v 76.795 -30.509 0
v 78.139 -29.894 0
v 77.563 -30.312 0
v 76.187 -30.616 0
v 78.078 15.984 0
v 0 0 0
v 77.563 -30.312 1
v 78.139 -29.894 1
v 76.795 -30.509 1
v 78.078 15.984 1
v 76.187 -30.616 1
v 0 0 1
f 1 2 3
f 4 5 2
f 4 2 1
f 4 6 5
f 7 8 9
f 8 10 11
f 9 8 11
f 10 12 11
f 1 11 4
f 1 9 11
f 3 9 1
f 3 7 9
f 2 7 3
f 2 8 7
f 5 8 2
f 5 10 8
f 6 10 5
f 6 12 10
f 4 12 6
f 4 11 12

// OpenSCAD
// Generated by SolidPython 1.1.3 on 2024-05-19 23:35:49


linear_extrude(height = 1) {
	polygon(points = [[0, 0], [76.1867937500, -30.6162875000], [76.2421125000, -30.6065250000], [76.2974312500, -30.5967625000], [76.3527500000, -30.5870000000], [76.4080687500, -30.5772375000], [76.4633875000, -30.5674750000], [76.5187062500, -30.5577125000], [76.5740250000, -30.5479500000], [76.6293437500, -30.5381875000], [76.6846625000, -30.5284250000], [76.7399812500, -30.5186625000], [76.7953000000, -30.5089000000], [76.8603250000, -30.4922750000], [76.9253500000, -30.4756500000], [76.9903750000, -30.4590250000], [77.0554000000, -30.4424000000], [77.1204250000, -30.4257750000], [77.1854500000, -30.4091500000], [77.2504750000, -30.3925250000], [77.3155000000, -30.3759000000], [77.3774500000, -30.3600500000], [77.4394000000, -30.3442000000], [77.5013500000, -30.3283500000], [77.5633000000, -30.3125000000], [77.6128375000, -30.2765625000], [77.6623750000, -30.2406250000], [77.7119125000, -30.2046875000], [77.7614500000, -30.1687500000], [77.8109875000, -30.1328125000], [77.8605250000, -30.0968750000], [77.9100625000, -30.0609375000], [77.9596000000, -30.0250000000], [78.0045750000, -29.9923750000], [78.0495500000, -29.9597500000], [78.0945250000, -29.9271250000], [78.1395000000, -29.8945000000], [78.1394209961, -29.8359062500], [78.1393419922, -29.7773125000], [78.1392629883, -29.7187187500], [78.1391839844, -29.6601250000], [78.1391049805, -29.6015312500], [78.1390259766, -29.5429375000], [78.1389469727, -29.4843437500], [78.1388679687, -29.4257500000], [78.1387889648, -29.3671562500], [78.1387099609, -29.3085625000], [78.1386309570, -29.2499687500], [78.1385519531, -29.1913750000], [78.1384729492, -29.1327812500], [78.1383939453, -29.0741875000], [78.1383149414, -29.0155937500], [78.1382359375, -28.9570000000], [78.1381569336, -28.8984062500], [78.1380779297, -28.8398125000], [78.1379989258, -28.7812187500], [78.1379199219, -28.7226250000], [78.1378409180, -28.6640312500], [78.1377619141, -28.6054375000], [78.1376829102, -28.5468437500], [78.1376039063, -28.4882500000], [78.1375249023, -28.4296562500], [78.1374458984, -28.3710625000], [78.1373668945, -28.3124687500], [78.1372878906, -28.2538750000], [78.1372088867, -28.1952812500], [78.1371298828, -28.1366875000], [78.1370508789, -28.0780937500], [78.1369718750, -28.0195000000], [78.1368928711, -27.9609062500], [78.1368138672, -27.9023125000], [78.1367348633, -27.8437187500], [78.1366558594, -27.7851250000], [78.1365768555, -27.7265312500], [78.1364978516, -27.6679375000], [78.1364188477, -27.6093437500], [78.1363398437, -27.5507500000], [78.1362608398, -27.4921562500], [78.1361818359, -27.4335625000], [78.1361028320, -27.3749687500], [78.1360238281, -27.3163750000], [78.1359448242, -27.2577812500], [78.1358658203, -27.1991875000], [78.1357868164, -27.1405937500], [78.1357078125, -27.0820000000], [78.1356288086, -27.0234062500], [78.1355498047, -26.9648125000], [78.1354708008, -26.9062187500], [78.1353917969, -26.8476250000], [78.1353127930, -26.7890312500], [78.1352337891, -26.7304375000], [78.1351547852, -26.6718437500], [78.1350757813, -26.6132500000], [78.1349967773, -26.5546562500], [78.1349177734, -26.4960625000], [78.1348387695, -26.4374687500], [78.1347597656, -26.3788750000], [78.1346807617, -26.3202812500], [78.1346017578, -26.2616875000], [78.1345227539, -26.2030937500], [78.1344437500, -26.1445000000], [78.1343647461, -26.0859062500], [78.1342857422, -26.0273125000], [78.1342067383, -25.9687187500], [78.1341277344, -25.9101250000], [78.1340487305, -25.8515312500], [78.1339697266, -25.7929375000], [78.1338907227, -25.7343437500], [78.1338117187, -25.6757500000], [78.1337327148, -25.6171562500], [78.1336537109, -25.5585625000], [78.1335747070, -25.4999687500], [78.1334957031, -25.4413750000], [78.1334166992, -25.3827812500], [78.1333376953, -25.3241875000], [78.1332586914, -25.2655937500], [78.1331796875, -25.2070000000], [78.1331006836, -25.1484062500], [78.1330216797, -25.0898125000], [78.1329426758, -25.0312187500], [78.1328636719, -24.9726250000], [78.1327846680, -24.9140312500], [78.1327056641, -24.8554375000], [78.1326266602, -24.7968437500], [78.1325476563, -24.7382500000], [78.1324686523, -24.6796562500], [78.1323896484, -24.6210625000], [78.1323106445, -24.5624687500], [78.1322316406, -24.5038750000], [78.1321526367, -24.4452812500], [78.1320736328, -24.3866875000], [78.1319946289, -24.3280937500], [78.1319156250, -24.2695000000], [78.1318366211, -24.2109062500], [78.1317576172, -24.1523125000], [78.1316786133, -24.0937187500], [78.1315996094, -24.0351250000], [78.1315206055, -23.9765312500], [78.1314416016, -23.9179375000], [78.1313625977, -23.8593437500], [78.1312835937, -23.8007500000], [78.1312045898, -23.7421562500], [78.1311255859, -23.6835625000], [78.1310465820, -23.6249687500], [78.1309675781, -23.5663750000], [78.1308885742, -23.5077812500], [78.1308095703, -23.4491875000], [78.1307305664, -23.3905937500], [78.1306515625, -23.3320000000], [78.1305725586, -23.2734062500], [78.1304935547, -23.2148125000], [78.1304145508, -23.1562187500], [78.1303355469, -23.0976250000], [78.1302565430, -23.0390312500], [78.1301775391, -22.9804375000], [78.1300985352, -22.9218437500], [78.1300195313, -22.8632500000], [78.1299405273, -22.8046562500], [78.1298615234, -22.7460625000], [78.1297825195, -22.6874687500], [78.1297035156, -22.6288750000], [78.1296245117, -22.5702812500], [78.1295455078, -22.5116875000], [78.1294665039, -22.4530937500], [78.1293875000, -22.3945000000], [78.1293084961, -22.3359062500], [78.1292294922, -22.2773125000], [78.1291504883, -22.2187187500], [78.1290714844, -22.1601250000], [78.1289924805, -22.1015312500], [78.1289134766, -22.0429375000], [78.1288344727, -21.9843437500], [78.1287554688, -21.9257500000], [78.1286764648, -21.8671562500], [78.1285974609, -21.8085625000], [78.1285184570, -21.7499687500], [78.1284394531, -21.6913750000], [78.1283604492, -21.6327812500], [78.1282814453, -21.5741875000], [78.1282024414, -21.5155937500], [78.1281234375, -21.4570000000], [78.1280444336, -21.3984062500], [78.1279654297, -21.3398125000], [78.1278864258, -21.2812187500], [78.1278074219, -21.2226250000], [78.1277284180, -21.1640312500], [78.1276494141, -21.1054375000], [78.1275704102, -21.0468437500], [78.1274914063, -20.9882500000], [78.1274124023, -20.9296562500], [78.1273333984, -20.8710625000], [78.1272543945, -20.8124687500], [78.1271753906, -20.7538750000], [78.1270963867, -20.6952812500], [78.1270173828, -20.6366875000], [78.1269383789, -20.5780937500], [78.1268593750, -20.5195000000], [78.1267803711, -20.4609062500], [78.1267013672, -20.4023125000], [78.1266223633, -20.3437187500], [78.1265433594, -20.2851250000], [78.1264643555, -20.2265312500], [78.1263853516, -20.1679375000], [78.1263063477, -20.1093437500], [78.1262273438, -20.0507500000], [78.1261483398, -19.9921562500], [78.1260693359, -19.9335625000], [78.1259903320, -19.8749687500], [78.1259113281, -19.8163750000], [78.1258323242, -19.7577812500], [78.1257533203, -19.6991875000], [78.1256743164, -19.6405937500], [78.1255953125, -19.5820000000], [78.1255163086, -19.5234062500], [78.1254373047, -19.4648125000], [78.1253583008, -19.4062187500], [78.1252792969, -19.3476250000], [78.1252002930, -19.2890312500], [78.1251212891, -19.2304375000], [78.1250422852, -19.1718437500], [78.1249632813, -19.1132500000], [78.1248842773, -19.0546562500], [78.1248052734, -18.9960625000], [78.1247262695, -18.9374687500], [78.1246472656, -18.8788750000], [78.1245682617, -18.8202812500], [78.1244892578, -18.7616875000], [78.1244102539, -18.7030937500], [78.1243312500, -18.6445000000], [78.1242522461, -18.5859062500], [78.1241732422, -18.5273125000], [78.1240942383, -18.4687187500], [78.1240152344, -18.4101250000], [78.1239362305, -18.3515312500], [78.1238572266, -18.2929375000], [78.1237782227, -18.2343437500], [78.1236992188, -18.1757500000], [78.1236202148, -18.1171562500], [78.1235412109, -18.0585625000], [78.1234622070, -17.9999687500], [78.1233832031, -17.9413750000], [78.1233041992, -17.8827812500], [78.1232251953, -17.8241875000], [78.1231461914, -17.7655937500], [78.1230671875, -17.7070000000], [78.1229881836, -17.6484062500], [78.1229091797, -17.5898125000], [78.1228301758, -17.5312187500], [78.1227511719, -17.4726250000], [78.1226721680, -17.4140312500], [78.1225931641, -17.3554375000], [78.1225141602, -17.2968437500], [78.1224351563, -17.2382500000], [78.1223561523, -17.1796562500], [78.1222771484, -17.1210625000], [78.1221981445, -17.0624687500], [78.1221191406, -17.0038750000], [78.1220401367, -16.9452812500], [78.1219611328, -16.8866875000], [78.1218821289, -16.8280937500], [78.1218031250, -16.7695000000], [78.1217241211, -16.7109062500], [78.1216451172, -16.6523125000], [78.1215661133, -16.5937187500], [78.1214871094, -16.5351250000], [78.1214081055, -16.4765312500], [78.1213291016, -16.4179375000], [78.1212500977, -16.3593437500], [78.1211710938, -16.3007500000], [78.1210920898, -16.2421562500], [78.1210130859, -16.1835625000], [78.1209340820, -16.1249687500], [78.1208550781, -16.0663750000], [78.1207760742, -16.0077812500], [78.1206970703, -15.9491875000], [78.1206180664, -15.8905937500], [78.1205390625, -15.8320000000], [78.1204600586, -15.7734062500], [78.1203810547, -15.7148125000], [78.1203020508, -15.6562187500], [78.1202230469, -15.5976250000], [78.1201440430, -15.5390312500], [78.1200650391, -15.4804375000], [78.1199860352, -15.4218437500], [78.1199070312, -15.3632500000], [78.1198280273, -15.3046562500], [78.1197490234, -15.2460625000], [78.1196700195, -15.1874687500], [78.1195910156, -15.1288750000], [78.1195120117, -15.0702812500], [78.1194330078, -15.0116875000], [78.1193540039, -14.9530937500], [78.1192750000, -14.8945000000], [78.1191959961, -14.8359062500], [78.1191169922, -14.7773125000], [78.1190379883, -14.7187187500], [78.1189589844, -14.6601250000], [78.1188799805, -14.6015312500], [78.1188009766, -14.5429375000], [78.1187219727, -14.4843437500], [78.1186429688, -14.4257500000], [78.1185639648, -14.3671562500], [78.1184849609, -14.3085625000], [78.1184059570, -14.2499687500], [78.1183269531, -14.1913750000], [78.1182479492, -14.1327812500], [78.1181689453, -14.0741875000], [78.1180899414, -14.0155937500], [78.1180109375, -13.9570000000], [78.1179319336, -13.8984062500], [78.1178529297, -13.8398125000], [78.1177739258, -13.7812187500], [78.1176949219, -13.7226250000], [78.1176159180, -13.6640312500], [78.1175369141, -13.6054375000], [78.1174579102, -13.5468437500], [78.1173789062, -13.4882500000], [78.1172999023, -13.4296562500], [78.1172208984, -13.3710625000], [78.1171418945, -13.3124687500], [78.1170628906, -13.2538750000], [78.1169838867, -13.1952812500], [78.1169048828, -13.1366875000], [78.1168258789, -13.0780937500], [78.1167468750, -13.0195000000], [78.1166678711, -12.9609062500], [78.1165888672, -12.9023125000], [78.1165098633, -12.8437187500], [78.1164308594, -12.7851250000], [78.1163518555, -12.7265312500], [78.1162728516, -12.6679375000], [78.1161938477, -12.6093437500], [78.1161148437, -12.5507500000], [78.1160358398, -12.4921562500], [78.1159568359, -12.4335625000], [78.1158778320, -12.3749687500], [78.1157988281, -12.3163750000], [78.1157198242, -12.2577812500], [78.1156408203, -12.1991875000], [78.1155618164, -12.1405937500], [78.1154828125, -12.0820000000], [78.1154038086, -12.0234062500], [78.1153248047, -11.9648125000], [78.1152458008, -11.9062187500], [78.1151667969, -11.8476250000], [78.1150877930, -11.7890312500], [78.1150087891, -11.7304375000], [78.1149297852, -11.6718437500], [78.1148507812, -11.6132500000], [78.1147717773, -11.5546562500], [78.1146927734, -11.4960625000], [78.1146137695, -11.4374687500], [78.1145347656, -11.3788750000], [78.1144557617, -11.3202812500], [78.1143767578, -11.2616875000], [78.1142977539, -11.2030937500], [78.1142187500, -11.1445000000], [78.1141397461, -11.0859062500], [78.1140607422, -11.0273125000], [78.1139817383, -10.9687187500], [78.1139027344, -10.9101250000], [78.1138237305, -10.8515312500], [78.1137447266, -10.7929375000], [78.1136657227, -10.7343437500], [78.1135867187, -10.6757500000], [78.1135077148, -10.6171562500], [78.1134287109, -10.5585625000], [78.1133497070, -10.4999687500], [78.1132707031, -10.4413750000], [78.1131916992, -10.3827812500], [78.1131126953, -10.3241875000], [78.1130336914, -10.2655937500], [78.1129546875, -10.2070000000], [78.1128756836, -10.1484062500], [78.1127966797, -10.0898125000], [78.1127176758, -10.0312187500], [78.1126386719, -9.9726250000], [78.1125596680, -9.9140312500], [78.1124806641, -9.8554375000], [78.1124016602, -9.7968437500], [78.1123226563, -9.7382500000], [78.1122436523, -9.6796562500], [78.1121646484, -9.6210625000], [78.1120856445, -9.5624687500], [78.1120066406, -9.5038750000], [78.1119276367, -9.4452812500], [78.1118486328, -9.3866875000], [78.1117696289, -9.3280937500], [78.1116906250, -9.2695000000], [78.1116116211, -9.2109062500], [78.1115326172, -9.1523125000], [78.1114536133, -9.0937187500], [78.1113746094, -9.0351250000], [78.1112956055, -8.9765312500], [78.1112166016, -8.9179375000], [78.1111375977, -8.8593437500], [78.1110585937, -8.8007500000], [78.1109795898, -8.7421562500], [78.1109005859, -8.6835625000], [78.1108215820, -8.6249687500], [78.1107425781, -8.5663750000], [78.1106635742, -8.5077812500], [78.1105845703, -8.4491875000], [78.1105055664, -8.3905937500], [78.1104265625, -8.3320000000], [78.1103475586, -8.2734062500], [78.1102685547, -8.2148125000], [78.1101895508, -8.1562187500], [78.1101105469, -8.0976250000], [78.1100315430, -8.0390312500], [78.1099525391, -7.9804375000], [78.1098735352, -7.9218437500], [78.1097945313, -7.8632500000], [78.1097155273, -7.8046562500], [78.1096365234, -7.7460625000], [78.1095575195, -7.6874687500], [78.1094785156, -7.6288750000], [78.1093995117, -7.5702812500], [78.1093205078, -7.5116875000], [78.1092415039, -7.4530937500], [78.1091625000, -7.3945000000], [78.1090834961, -7.3359062500], [78.1090044922, -7.2773125000], [78.1089254883, -7.2187187500], [78.1088464844, -7.1601250000], [78.1087674805, -7.1015312500], [78.1086884766, -7.0429375000], [78.1086094727, -6.9843437500], [78.1085304687, -6.9257500000], [78.1084514648, -6.8671562500], [78.1083724609, -6.8085625000], [78.1082934570, -6.7499687500], [78.1082144531, -6.6913750000], [78.1081354492, -6.6327812500], [78.1080564453, -6.5741875000], [78.1079774414, -6.5155937500], [78.1078984375, -6.4570000000], [78.1078194336, -6.3984062500], [78.1077404297, -6.3398125000], [78.1076614258, -6.2812187500], [78.1075824219, -6.2226250000], [78.1075034180, -6.1640312500], [78.1074244141, -6.1054375000], [78.1073454102, -6.0468437500], [78.1072664063, -5.9882500000], [78.1071874023, -5.9296562500], [78.1071083984, -5.8710625000], [78.1070293945, -5.8124687500], [78.1069503906, -5.7538750000], [78.1068713867, -5.6952812500], [78.1067923828, -5.6366875000], [78.1067133789, -5.5780937500], [78.1066343750, -5.5195000000], [78.1065553711, -5.4609062500], [78.1064763672, -5.4023125000], [78.1063973633, -5.3437187500], [78.1063183594, -5.2851250000], [78.1062393555, -5.2265312500], [78.1061603516, -5.1679375000], [78.1060813477, -5.1093437500], [78.1060023437, -5.0507500000], [78.1059233398, -4.9921562500], [78.1058443359, -4.9335625000], [78.1057653320, -4.8749687500], [78.1056863281, -4.8163750000], [78.1056073242, -4.7577812500], [78.1055283203, -4.6991875000], [78.1054493164, -4.6405937500], [78.1053703125, -4.5820000000], [78.1052913086, -4.5234062500], [78.1052123047, -4.4648125000], [78.1051333008, -4.4062187500], [78.1050542969, -4.3476250000], [78.1049752930, -4.2890312500], [78.1048962891, -4.2304375000], [78.1048172852, -4.1718437500], [78.1047382813, -4.1132500000], [78.1046592773, -4.0546562500], [78.1045802734, -3.9960625000], [78.1045012695, -3.9374687500], [78.1044222656, -3.8788750000], [78.1043432617, -3.8202812500], [78.1042642578, -3.7616875000], [78.1041852539, -3.7030937500], [78.1041062500, -3.6445000000], [78.1040272461, -3.5859062500], [78.1039482422, -3.5273125000], [78.1038692383, -3.4687187500], [78.1037902344, -3.4101250000], [78.1037112305, -3.3515312500], [78.1036322266, -3.2929375000], [78.1035532227, -3.2343437500], [78.1034742187, -3.1757500000], [78.1033952148, -3.1171562500], [78.1033162109, -3.0585625000], [78.1032372070, -2.9999687500], [78.1031582031, -2.9413750000], [78.1030791992, -2.8827812500], [78.1030001953, -2.8241875000], [78.1029211914, -2.7655937500], [78.1028421875, -2.7070000000], [78.1027631836, -2.6484062500], [78.1026841797, -2.5898125000], [78.1026051758, -2.5312187500], [78.1025261719, -2.4726250000], [78.1024471680, -2.4140312500], [78.1023681641, -2.3554375000], [78.1022891602, -2.2968437500], [78.1022101563, -2.2382500000], [78.1021311523, -2.1796562500], [78.1020521484, -2.1210625000], [78.1019731445, -2.0624687500], [78.1018941406, -2.0038750000], [78.1018151367, -1.9452812500], [78.1017361328, -1.8866875000], [78.1016571289, -1.8280937500], [78.1015781250, -1.7695000000], [78.1014991211, -1.7109062500], [78.1014201172, -1.6523125000], [78.1013411133, -1.5937187500], [78.1012621094, -1.5351250000], [78.1011831055, -1.4765312500], [78.1011041016, -1.4179375000], [78.1010250977, -1.3593437500], [78.1009460937, -1.3007500000], [78.1008670898, -1.2421562500], [78.1007880859, -1.1835625000], [78.1007090820, -1.1249687500], [78.1006300781, -1.0663750000], [78.1005510742, -1.0077812500], [78.1004720703, -0.9491875000], [78.1003930664, -0.8905937500], [78.1003140625, -0.8320000000], [78.1002350586, -0.7734062500], [78.1001560547, -0.7148125000], [78.1000770508, -0.6562187500], [78.0999980469, -0.5976250000], [78.0999190430, -0.5390312500], [78.0998400391, -0.4804375000], [78.0997610352, -0.4218437500], [78.0996820313, -0.3632500000], [78.0996030273, -0.3046562500], [78.0995240234, -0.2460625000], [78.0994450195, -0.1874687500], [78.0993660156, -0.1288750000], [78.0992870117, -0.0702812500], [78.0992080078, -0.0116875000], [78.0991290039, 0.0469062500], [78.0990500000, 0.1055000000], [78.0989709961, 0.1640937500], [78.0988919922, 0.2226875000], [78.0988129883, 0.2812812500], [78.0987339844, 0.3398750000], [78.0986549805, 0.3984687500], [78.0985759766, 0.4570625000], [78.0984969727, 0.5156562500], [78.0984179687, 0.5742500000], [78.0983389648, 0.6328437500], [78.0982599609, 0.6914375000], [78.0981809570, 0.7500312500], [78.0981019531, 0.8086250000], [78.0980229492, 0.8672187500], [78.0979439453, 0.9258125000], [78.0978649414, 0.9844062500], [78.0977859375, 1.0430000000], [78.0977069336, 1.1015937500], [78.0976279297, 1.1601875000], [78.0975489258, 1.2187812500], [78.0974699219, 1.2773750000], [78.0973909180, 1.3359687500], [78.0973119141, 1.3945625000], [78.0972329102, 1.4531562500], [78.0971539063, 1.5117500000], [78.0970749023, 1.5703437500], [78.0969958984, 1.6289375000], [78.0969168945, 1.6875312500], [78.0968378906, 1.7461250000], [78.0967588867, 1.8047187500], [78.0966798828, 1.8633125000], [78.0966008789, 1.9219062500], [78.0965218750, 1.9805000000], [78.0964428711, 2.0390937500], [78.0963638672, 2.0976875000], [78.0962848633, 2.1562812500], [78.0962058594, 2.2148750000], [78.0961268555, 2.2734687500], [78.0960478516, 2.3320625000], [78.0959688477, 2.3906562500], [78.0958898438, 2.4492500000], [78.0958108398, 2.5078437500], [78.0957318359, 2.5664375000], [78.0956528320, 2.6250312500], [78.0955738281, 2.6836250000], [78.0954948242, 2.7422187500], [78.0954158203, 2.8008125000], [78.0953368164, 2.8594062500], [78.0952578125, 2.9180000000], [78.0951788086, 2.9765937500], [78.0950998047, 3.0351875000], [78.0950208008, 3.0937812500], [78.0949417969, 3.1523750000], [78.0948627930, 3.2109687500], [78.0947837891, 3.2695625000], [78.0947047852, 3.3281562500], [78.0946257813, 3.3867500000], [78.0945467773, 3.4453437500], [78.0944677734, 3.5039375000], [78.0943887695, 3.5625312500], [78.0943097656, 3.6211250000], [78.0942307617, 3.6797187500], [78.0941517578, 3.7383125000], [78.0940727539, 3.7969062500], [78.0939937500, 3.8555000000], [78.0939147461, 3.9140937500], [78.0938357422, 3.9726875000], [78.0937567383, 4.0312812500], [78.0936777344, 4.0898750000], [78.0935987305, 4.1484687500], [78.0935197266, 4.2070625000], [78.0934407227, 4.2656562500], [78.0933617188, 4.3242500000], [78.0932827148, 4.3828437500], [78.0932037109, 4.4414375000], [78.0931247070, 4.5000312500], [78.0930457031, 4.5586250000], [78.0929666992, 4.6172187500], [78.0928876953, 4.6758125000], [78.0928086914, 4.7344062500], [78.0927296875, 4.7930000000], [78.0926506836, 4.8515937500], [78.0925716797, 4.9101875000], [78.0924926758, 4.9687812500], [78.0924136719, 5.0273750000], [78.0923346680, 5.0859687500], [78.0922556641, 5.1445625000], [78.0921766602, 5.2031562500], [78.0920976563, 5.2617500000], [78.0920186523, 5.3203437500], [78.0919396484, 5.3789375000], [78.0918606445, 5.4375312500], [78.0917816406, 5.4961250000], [78.0917026367, 5.5547187500], [78.0916236328, 5.6133125000], [78.0915446289, 5.6719062500], [78.0914656250, 5.7305000000], [78.0913866211, 5.7890937500], [78.0913076172, 5.8476875000], [78.0912286133, 5.9062812500], [78.0911496094, 5.9648750000], [78.0910706055, 6.0234687500], [78.0909916016, 6.0820625000], [78.0909125977, 6.1406562500], [78.0908335938, 6.1992500000], [78.0907545898, 6.2578437500], [78.0906755859, 6.3164375000], [78.0905965820, 6.3750312500], [78.0905175781, 6.4336250000], [78.0904385742, 6.4922187500], [78.0903595703, 6.5508125000], [78.0902805664, 6.6094062500], [78.0902015625, 6.6680000000], [78.0901225586, 6.7265937500], [78.0900435547, 6.7851875000], [78.0899645508, 6.8437812500], [78.0898855469, 6.9023750000], [78.0898065430, 6.9609687500], [78.0897275391, 7.0195625000], [78.0896485352, 7.0781562500], [78.0895695312, 7.1367500000], [78.0894905273, 7.1953437500], [78.0894115234, 7.2539375000], [78.0893325195, 7.3125312500], [78.0892535156, 7.3711250000], [78.0891745117, 7.4297187500], [78.0890955078, 7.4883125000], [78.0890165039, 7.5469062500], [78.0889375000, 7.6055000000], [78.0888584961, 7.6640937500], [78.0887794922, 7.7226875000], [78.0887004883, 7.7812812500], [78.0886214844, 7.8398750000], [78.0885424805, 7.8984687500], [78.0884634766, 7.9570625000], [78.0883844727, 8.0156562500], [78.0883054688, 8.0742500000], [78.0882264648, 8.1328437500], [78.0881474609, 8.1914375000], [78.0880684570, 8.2500312500], [78.0879894531, 8.3086250000], [78.0879104492, 8.3672187500], [78.0878314453, 8.4258125000], [78.0877524414, 8.4844062500], [78.0876734375, 8.5430000000], [78.0875944336, 8.6015937500], [78.0875154297, 8.6601875000], [78.0874364258, 8.7187812500], [78.0873574219, 8.7773750000], [78.0872784180, 8.8359687500], [78.0871994141, 8.8945625000], [78.0871204102, 8.9531562500], [78.0870414062, 9.0117500000], [78.0869624023, 9.0703437500], [78.0868833984, 9.1289375000], [78.0868043945, 9.1875312500], [78.0867253906, 9.2461250000], [78.0866463867, 9.3047187500], [78.0865673828, 9.3633125000], [78.0864883789, 9.4219062500], [78.0864093750, 9.4805000000], [78.0863303711, 9.5390937500], [78.0862513672, 9.5976875000], [78.0861723633, 9.6562812500], [78.0860933594, 9.7148750000], [78.0860143555, 9.7734687500], [78.0859353516, 9.8320625000], [78.0858563477, 9.8906562500], [78.0857773437, 9.9492500000], [78.0856983398, 10.0078437500], [78.0856193359, 10.0664375000], [78.0855403320, 10.1250312500], [78.0854613281, 10.1836250000], [78.0853823242, 10.2422187500], [78.0853033203, 10.3008125000], [78.0852243164, 10.3594062500], [78.0851453125, 10.4180000000], [78.0850663086, 10.4765937500], [78.0849873047, 10.5351875000], [78.0849083008, 10.5937812500], [78.0848292969, 10.6523750000], [78.0847502930, 10.7109687500], [78.0846712891, 10.7695625000], [78.0845922852, 10.8281562500], [78.0845132812, 10.8867500000], [78.0844342773, 10.9453437500], [78.0843552734, 11.0039375000], [78.0842762695, 11.0625312500], [78.0841972656, 11.1211250000], [78.0841182617, 11.1797187500], [78.0840392578, 11.2383125000], [78.0839602539, 11.2969062500], [78.0838812500, 11.3555000000], [78.0838022461, 11.4140937500], [78.0837232422, 11.4726875000], [78.0836442383, 11.5312812500], [78.0835652344, 11.5898750000], [78.0834862305, 11.6484687500], [78.0834072266, 11.7070625000], [78.0833282227, 11.7656562500], [78.0832492187, 11.8242500000], [78.0831702148, 11.8828437500], [78.0830912109, 11.9414375000], [78.0830122070, 12.0000312500], [78.0829332031, 12.0586250000], [78.0828541992, 12.1172187500], [78.0827751953, 12.1758125000], [78.0826961914, 12.2344062500], [78.0826171875, 12.2930000000], [78.0825381836, 12.3515937500], [78.0824591797, 12.4101875000], [78.0823801758, 12.4687812500], [78.0823011719, 12.5273750000], [78.0822221680, 12.5859687500], [78.0821431641, 12.6445625000], [78.0820641602, 12.7031562500], [78.0819851562, 12.7617500000], [78.0819061523, 12.8203437500], [78.0818271484, 12.8789375000], [78.0817481445, 12.9375312500], [78.0816691406, 12.9961250000], [78.0815901367, 13.0547187500], [78.0815111328, 13.1133125000], [78.0814321289, 13.1719062500], [78.0813531250, 13.2305000000], [78.0812741211, 13.2890937500], [78.0811951172, 13.3476875000], [78.0811161133, 13.4062812500], [78.0810371094, 13.4648750000], [78.0809581055, 13.5234687500], [78.0808791016, 13.5820625000], [78.0808000977, 13.6406562500], [78.0807210937, 13.6992500000], [78.0806420898, 13.7578437500], [78.0805630859, 13.8164375000], [78.0804840820, 13.8750312500], [78.0804050781, 13.9336250000], [78.0803260742, 13.9922187500], [78.0802470703, 14.0508125000], [78.0801680664, 14.1094062500], [78.0800890625, 14.1680000000], [78.0800100586, 14.2265937500], [78.0799310547, 14.2851875000], [78.0798520508, 14.3437812500], [78.0797730469, 14.4023750000], [78.0796940430, 14.4609687500], [78.0796150391, 14.5195625000], [78.0795360352, 14.5781562500], [78.0794570313, 14.6367500000], [78.0793780273, 14.6953437500], [78.0792990234, 14.7539375000], [78.0792200195, 14.8125312500], [78.0791410156, 14.8711250000], [78.0790620117, 14.9297187500], [78.0789830078, 14.9883125000], [78.0789040039, 15.0469062500], [78.0788250000, 15.1055000000], [78.0787459961, 15.1640937500], [78.0786669922, 15.2226875000], [78.0785879883, 15.2812812500], [78.0785089844, 15.3398750000], [78.0784299805, 15.3984687500], [78.0783509766, 15.4570625000], [78.0782719727, 15.5156562500], [78.0781929687, 15.5742500000], [78.0781139648, 15.6328437500], [78.0780349609, 15.6914375000], [78.0779559570, 15.7500312500], [78.0778769531, 15.8086250000], [78.0777979492, 15.8672187500], [78.0777189453, 15.9258125000], [78.0776399414, 15.9844062500]]);
}
/***********************************************
*********      SolidPython code:      **********
************************************************
 
import math
import time

from stl import mesh, Dimension

from tkinter import Tk     # from tkinter import Tk for Python 3.x
from tkinter.filedialog import askopenfilename
from mpl_toolkits.mplot3d import art3d
from matplotlib import pyplot as plt
import solid
import os
import ezdxf
import shapely.geometry as sg
import subprocess
from GUI import getSCADPath



def outputSTL(From, To, PATH=getSCADPath()):
    subprocess.Popen(PATH + " -o " + To + " " + From)
    while not os.path.exists(To):
        time.sleep(1)


def get_size(i):
    x_list = [int(a) for a in str(i)]
    return len(x_list)



class Model:
    def __init__(self, model, fileName, location, layer, thickness):
        self.location = location
        self.code = None
        self.fileName = fileName
        self.stl = fileName + ".stl"
        self.layer = layer
        self.thickness = thickness
        self.maxz = (layer+1)*thickness
        self.dxf = fileName + ".dxf"
        self.scad = fileName + ".scad"
        self.model = model
        self.center = None
        self.width = 10
        self.mesh = None
        self.useable_area = None


    def get_code(self):
        max_dim = 0.05
        max_array = 6

        num = int(self.fileName)
        nums = [int(a) for a in str(num)]
        nums.reverse()
        indices = nums
        length = len(nums)

        print(indices)
        t = 0
        i = 0
        cubes = []
        x = 0
        y = 0
        width = 0.01
        while x <= max_dim:
            while y <= max_dim:
                print(indices)
                if nums == []:
                    break
                if indices[0] != 0:
                    cubes.append(solid.translate([x, y, 0])(solid.cube(size=t / 1000 + 0.001)))
                    y += max_dim / (max_array - 1)
                    nums[0] = nums[0] - 1
                else:
                    indices.pop(0)
                    t += 1
                i += 1
            x += max_dim / (max_array - 1)
            y = 0

        outside = solid.translate([-width / 2, -width / 2])(solid.cube(max_dim + (length - 1) / 1000 + 0.001 + width))
        self.code = solid.difference()(outside, cubes)
        self.code = solid.projection(cut=True)(self.code)
        solid.scad_render_to_file(self.code, self.location + "/code.scad")
        outputSTL(From=self.location+"/code.scad", To=self.location+"code.dxf", PATH=getSCADPath())
        # os.system("toSTL.sh renders/code.scad renders/code.dxf")
        return self.location+"/code.dxf"

    def download(self, type):
        if type =="stl":
            print("generating:" + self.location+"/"+ self.fileName+".stl")
            outputSTL(From=self.location+"/"+self.fileName+".scad", To=self.location+"/"+self.fileName+".stl")
            # os.system("toSTL.sh renders/"+ self.fileName+".scad renders/"+ self.fileName+".stl")
        elif type == "dxf":
            outputSTL(From=self.location+"/"+self.fileName+".scad", To=self.location+"/"+self.fileName+".dxf")
            # os.system("toSTL.sh renders/"+ self.fileName+".scad renders/"+ self.fileName+".dxf")

    def render(self):
        solid.scad_render_to_file(self.model, self.location+"/"+ self.fileName+'.scad')
        while not os.path.exists(self.location+"/"+self.fileName+".scad"):
            time.sleep(1)

    def get_points(self):
        doc = ezdxf.readfile(filename=self.location+"/"+ self.fileName+".dxf")
        msp = doc.modelspace()
        i=0
        lists = []
        def helper(e):
            start = [e.dxf.start[0], e.dxf.start[1]]
            end = [e.dxf.end[0], e.dxf.end[1]]
            return [start, end]

        for e in msp.query("LINE"):
            line = helper(e)
            if not lists:
                lists.append([line])
            else:
                if lists[i][len(lists)-1][1] != line[0]:
                    lists.append([line])
                    i+=1
                else:
                    lists[i].append(line)

    def get_points2(self, FILE):
        doc = ezdxf.readfile(filename=FILE)
        msp = doc.modelspace()
        i = 0
        lists = []

        def helper(e):
            start = [e.dxf.start[0], e.dxf.start[1]]
            end = [e.dxf.end[0], e.dxf.end[1]]
            return (start, end)

        for e in msp.query("LINE"):
            line = helper(e)
            if lists==[]:
                lists.append([line])
            else:
                if lists[i][len(lists[i]) - 1][1] != line[0]:
                    lists.append([line])
                    i += 1
                else:
                    lists[i].append(line)
        return lists

    def add_code(self):
        dxf = solid.projection(cut=False)(self.model)
        offset = solid.offset(r=-0.1)(dxf)
        solid.scad_render_to_file(offset, self.location+'/offset.scad')
        os.system("toSTL.sh renders/offset.scad renders/offset.dxf")
        lines = self.get_points2("renders/offset.dxf")
        x = lines[0][0][0][0]
        y = lines[0][0][0][1]
        print(x)
        print(y)
        code = solid.translate([x,y,0])(self.code)
        code = solid.linear_extrude(height=999)(code)
        save = self.model
        self.model = solid.projection()(solid.difference()(self.model, code))
        self.render()
        self.download("dxf")
        self.model = save

    def add_label(self, pos):
        # num = 12
        # minx, maxx, miny, maxy, minz, maxz = self.find_minmax()
        maxz = self.maxz
        # label = solid.linear_extrude(height=(maxz-minz)/3)(solid.text(str(self.fileName), size=0.5, halign="center"))
        # i=minx
        # print("x-len: " + str(maxx-minx))
        # print(i)
        # inc = (maxx-minx)/num
        # while minx <= i <= maxx:
        #     label = solid.union()(solid.translate([i, 0, maxz - 0.2])(solid.linear_extrude(height=(maxz-minz)/3)(solid.text(str(self.fileName), size=0.25, halign="center"))), label)
        #     i += inc
        #
        # l = label
        #
        # i =miny
        # while miny<= i <= maxy:
        #     print("y inc")
        #     l = solid.union()(solid.translate([0, i, 0])(label), l)
        #     i += 0.5
        for i in str(self.fileName):
            cur = pos[0]
            label = solid.translate([pos[0][0], pos[0][1], self.maxz-0.2])(solid.linear_extrude(height=(self.thickness)/3)(solid.text(str(i), size=0.5, halign="center", valign="center")))
            self.model = solid.difference()(self.model, label)
            pos.append(pos.pop(0))
            while abs(cur[0]-pos[0][0])<0.5 and abs(cur[1]-pos[0][1])<0.5:
                pos.append(pos.pop(0))



    def Center(self):

        volume, cog, inertia = self.mesh.get_mass_properties()
        print("Volume                                  = {0}".format(volume))
        print("Position of the center of gravity (COG) = {0}".format(cog))
        m_centered = solid.translate([-cog[0], -cog[1], 0])(
            self.model
        )
        return m_centered

    def find_minmax(self):
        minx = maxx = miny = maxy = minz = maxz = None
        for p in self.mesh.points:
            # p contains (x, y, z)
            if minx is None:
                minx = p[Dimension.X]
                maxx = p[Dimension.X]
                miny = p[Dimension.Y]
                maxy = p[Dimension.Y]
                minz = p[Dimension.Z]
                maxz = p[Dimension.Z]
            else:
                maxx = max(p[Dimension.X], maxx)
                minx = min(p[Dimension.X], minx)
                maxy = max(p[Dimension.Y], maxy)
                miny = min(p[Dimension.Y], miny)
                maxz = max(p[Dimension.Z], maxz)
                minz = min(p[Dimension.Z], minz)
        lenx = maxx - minx
        leny = maxy - miny
        lenz = maxz - minz
        return minx, maxx, miny, maxy, minz, maxz

    # def generate_Mesh(self):
    #     self.mesh = mesh.Mesh.from_file(self.location + "/" + str(int(self.fileName)//8)+ "b.stl")

    def get_top(self):
        top = solid.projection(cut=True)(solid.translate([0,0,-1*self.thickness*(self.layer+1)])(self.model))
        useable_area = solid.offset(r=-0.45)(top)
        self.useable_area = useable_area
        solid.scad_render_to_file(self.useable_area, self.location+'/' + 'toptemp.scad')
        outputSTL(From=self.location+'/' + 'toptemp.scad', To=self.location+"/top"+ self.dxf)

        # os.system("toSTL.sh out/toptemp.scad renders/" + self.fileName + ".dxf")
        dxf = DXF(self.location+"/top"+ self.dxf)
        min_p=dxf.points[0][0]
        points_ordered = dxf.points
        i=0
        while i <= len(dxf.points)+1:
            while math.sqrt((dxf.points[0][0]-dxf.points[1][0])**2+(dxf.points[0][1]-dxf.points[1][1])**2) > 0.1:
                dxf.points.insert(1, [(dxf.points[0][0]+dxf.points[1][0])/2, (dxf.points[0][1]+dxf.points[1][1])/2])
                i = i-1
            dxf.points.append(dxf.points.pop(0))
            i+=1
        for i in range(len(dxf.points)):
            dxf.points.append(dxf.points.pop(0))
            if dxf.points[0][0] < min_p:
                min_p = dxf.points[0][0]
                points_ordered = dxf.points.copy()
        dxf.points = points_ordered.copy()

        print(dxf.points)
        self.add_label(dxf.points)

class DXF:
    def __init__(self, file):
        self.file = file
        self.Lines = []
        self.points = []
        doc = ezdxf.readfile(self.file)
        msp = doc.modelspace()
        for e in msp:
            if e.dxftype() == "LINE":
                self.Lines.append(e)
                self.points.append([e.dxf.start[0], e.dxf.start[1]])
        # self.points.append([self.Lines[-1].dxf.end[0], self.Lines[-1].dxf.end[1]])
        self.area = None
        self.center = None
        self.polygon = sg.Polygon(self.points)

    def get_area(self):
        self.area = self.polygon.area
        return self.area

    def get_center(self):
        x_sum = 0
        y_sum =0
        for i in self.points:
            x_sum += i[0]
            y_sum += i[1]
        x_c = x_sum/len(self.points)
        y_c = y_sum/len(self.points)
        return (x_c, y_c)

    def split(self, maxdim):
        splits = []
        length = 0
        pieces = [[]]
        prev = self.points[0]
        for j in self.points:
            length = length + math.sqrt((prev[0]-j[0])**2+(prev[1]-j[1])**2)
            if length >= maxdim:
                pieces[-1].append(j)
                pieces.append([])
                length = 0
            pieces[-1].append(j)
            prev = j
        for j in pieces:
            j.insert(0, [0,0])
            piece = solid.linear_extrude(height=1)(solid.polygon(j))
            splits.append(piece)
        return splits
    def refine_points(self):
        i=0
        while i <= len(self.points)+1:
            while math.sqrt((self.points[0][0]-self.points[1][0])**2+(self.points[0][1]-self.points[1][1])**2) > 0.1:
                self.points.insert(1, [(self.points[0][0]+self.points[1][0])/2, (self.points[0][1]+self.points[1][1])/2])
                i = i-1
            self.points.append(self.points.pop(0))
            i+=1


if __name__== "__main__":
    test = DXF("C:/Users/Daniel/Documents/repos/Shell_Maker/output/0top_slice.dxf")
    test.refine_points()
    k = test.split(48)
    for i in range(len(k)):
        solid.scad_render_to_file(k[i], str(i) + ".scad")


 
 
************************************************/
